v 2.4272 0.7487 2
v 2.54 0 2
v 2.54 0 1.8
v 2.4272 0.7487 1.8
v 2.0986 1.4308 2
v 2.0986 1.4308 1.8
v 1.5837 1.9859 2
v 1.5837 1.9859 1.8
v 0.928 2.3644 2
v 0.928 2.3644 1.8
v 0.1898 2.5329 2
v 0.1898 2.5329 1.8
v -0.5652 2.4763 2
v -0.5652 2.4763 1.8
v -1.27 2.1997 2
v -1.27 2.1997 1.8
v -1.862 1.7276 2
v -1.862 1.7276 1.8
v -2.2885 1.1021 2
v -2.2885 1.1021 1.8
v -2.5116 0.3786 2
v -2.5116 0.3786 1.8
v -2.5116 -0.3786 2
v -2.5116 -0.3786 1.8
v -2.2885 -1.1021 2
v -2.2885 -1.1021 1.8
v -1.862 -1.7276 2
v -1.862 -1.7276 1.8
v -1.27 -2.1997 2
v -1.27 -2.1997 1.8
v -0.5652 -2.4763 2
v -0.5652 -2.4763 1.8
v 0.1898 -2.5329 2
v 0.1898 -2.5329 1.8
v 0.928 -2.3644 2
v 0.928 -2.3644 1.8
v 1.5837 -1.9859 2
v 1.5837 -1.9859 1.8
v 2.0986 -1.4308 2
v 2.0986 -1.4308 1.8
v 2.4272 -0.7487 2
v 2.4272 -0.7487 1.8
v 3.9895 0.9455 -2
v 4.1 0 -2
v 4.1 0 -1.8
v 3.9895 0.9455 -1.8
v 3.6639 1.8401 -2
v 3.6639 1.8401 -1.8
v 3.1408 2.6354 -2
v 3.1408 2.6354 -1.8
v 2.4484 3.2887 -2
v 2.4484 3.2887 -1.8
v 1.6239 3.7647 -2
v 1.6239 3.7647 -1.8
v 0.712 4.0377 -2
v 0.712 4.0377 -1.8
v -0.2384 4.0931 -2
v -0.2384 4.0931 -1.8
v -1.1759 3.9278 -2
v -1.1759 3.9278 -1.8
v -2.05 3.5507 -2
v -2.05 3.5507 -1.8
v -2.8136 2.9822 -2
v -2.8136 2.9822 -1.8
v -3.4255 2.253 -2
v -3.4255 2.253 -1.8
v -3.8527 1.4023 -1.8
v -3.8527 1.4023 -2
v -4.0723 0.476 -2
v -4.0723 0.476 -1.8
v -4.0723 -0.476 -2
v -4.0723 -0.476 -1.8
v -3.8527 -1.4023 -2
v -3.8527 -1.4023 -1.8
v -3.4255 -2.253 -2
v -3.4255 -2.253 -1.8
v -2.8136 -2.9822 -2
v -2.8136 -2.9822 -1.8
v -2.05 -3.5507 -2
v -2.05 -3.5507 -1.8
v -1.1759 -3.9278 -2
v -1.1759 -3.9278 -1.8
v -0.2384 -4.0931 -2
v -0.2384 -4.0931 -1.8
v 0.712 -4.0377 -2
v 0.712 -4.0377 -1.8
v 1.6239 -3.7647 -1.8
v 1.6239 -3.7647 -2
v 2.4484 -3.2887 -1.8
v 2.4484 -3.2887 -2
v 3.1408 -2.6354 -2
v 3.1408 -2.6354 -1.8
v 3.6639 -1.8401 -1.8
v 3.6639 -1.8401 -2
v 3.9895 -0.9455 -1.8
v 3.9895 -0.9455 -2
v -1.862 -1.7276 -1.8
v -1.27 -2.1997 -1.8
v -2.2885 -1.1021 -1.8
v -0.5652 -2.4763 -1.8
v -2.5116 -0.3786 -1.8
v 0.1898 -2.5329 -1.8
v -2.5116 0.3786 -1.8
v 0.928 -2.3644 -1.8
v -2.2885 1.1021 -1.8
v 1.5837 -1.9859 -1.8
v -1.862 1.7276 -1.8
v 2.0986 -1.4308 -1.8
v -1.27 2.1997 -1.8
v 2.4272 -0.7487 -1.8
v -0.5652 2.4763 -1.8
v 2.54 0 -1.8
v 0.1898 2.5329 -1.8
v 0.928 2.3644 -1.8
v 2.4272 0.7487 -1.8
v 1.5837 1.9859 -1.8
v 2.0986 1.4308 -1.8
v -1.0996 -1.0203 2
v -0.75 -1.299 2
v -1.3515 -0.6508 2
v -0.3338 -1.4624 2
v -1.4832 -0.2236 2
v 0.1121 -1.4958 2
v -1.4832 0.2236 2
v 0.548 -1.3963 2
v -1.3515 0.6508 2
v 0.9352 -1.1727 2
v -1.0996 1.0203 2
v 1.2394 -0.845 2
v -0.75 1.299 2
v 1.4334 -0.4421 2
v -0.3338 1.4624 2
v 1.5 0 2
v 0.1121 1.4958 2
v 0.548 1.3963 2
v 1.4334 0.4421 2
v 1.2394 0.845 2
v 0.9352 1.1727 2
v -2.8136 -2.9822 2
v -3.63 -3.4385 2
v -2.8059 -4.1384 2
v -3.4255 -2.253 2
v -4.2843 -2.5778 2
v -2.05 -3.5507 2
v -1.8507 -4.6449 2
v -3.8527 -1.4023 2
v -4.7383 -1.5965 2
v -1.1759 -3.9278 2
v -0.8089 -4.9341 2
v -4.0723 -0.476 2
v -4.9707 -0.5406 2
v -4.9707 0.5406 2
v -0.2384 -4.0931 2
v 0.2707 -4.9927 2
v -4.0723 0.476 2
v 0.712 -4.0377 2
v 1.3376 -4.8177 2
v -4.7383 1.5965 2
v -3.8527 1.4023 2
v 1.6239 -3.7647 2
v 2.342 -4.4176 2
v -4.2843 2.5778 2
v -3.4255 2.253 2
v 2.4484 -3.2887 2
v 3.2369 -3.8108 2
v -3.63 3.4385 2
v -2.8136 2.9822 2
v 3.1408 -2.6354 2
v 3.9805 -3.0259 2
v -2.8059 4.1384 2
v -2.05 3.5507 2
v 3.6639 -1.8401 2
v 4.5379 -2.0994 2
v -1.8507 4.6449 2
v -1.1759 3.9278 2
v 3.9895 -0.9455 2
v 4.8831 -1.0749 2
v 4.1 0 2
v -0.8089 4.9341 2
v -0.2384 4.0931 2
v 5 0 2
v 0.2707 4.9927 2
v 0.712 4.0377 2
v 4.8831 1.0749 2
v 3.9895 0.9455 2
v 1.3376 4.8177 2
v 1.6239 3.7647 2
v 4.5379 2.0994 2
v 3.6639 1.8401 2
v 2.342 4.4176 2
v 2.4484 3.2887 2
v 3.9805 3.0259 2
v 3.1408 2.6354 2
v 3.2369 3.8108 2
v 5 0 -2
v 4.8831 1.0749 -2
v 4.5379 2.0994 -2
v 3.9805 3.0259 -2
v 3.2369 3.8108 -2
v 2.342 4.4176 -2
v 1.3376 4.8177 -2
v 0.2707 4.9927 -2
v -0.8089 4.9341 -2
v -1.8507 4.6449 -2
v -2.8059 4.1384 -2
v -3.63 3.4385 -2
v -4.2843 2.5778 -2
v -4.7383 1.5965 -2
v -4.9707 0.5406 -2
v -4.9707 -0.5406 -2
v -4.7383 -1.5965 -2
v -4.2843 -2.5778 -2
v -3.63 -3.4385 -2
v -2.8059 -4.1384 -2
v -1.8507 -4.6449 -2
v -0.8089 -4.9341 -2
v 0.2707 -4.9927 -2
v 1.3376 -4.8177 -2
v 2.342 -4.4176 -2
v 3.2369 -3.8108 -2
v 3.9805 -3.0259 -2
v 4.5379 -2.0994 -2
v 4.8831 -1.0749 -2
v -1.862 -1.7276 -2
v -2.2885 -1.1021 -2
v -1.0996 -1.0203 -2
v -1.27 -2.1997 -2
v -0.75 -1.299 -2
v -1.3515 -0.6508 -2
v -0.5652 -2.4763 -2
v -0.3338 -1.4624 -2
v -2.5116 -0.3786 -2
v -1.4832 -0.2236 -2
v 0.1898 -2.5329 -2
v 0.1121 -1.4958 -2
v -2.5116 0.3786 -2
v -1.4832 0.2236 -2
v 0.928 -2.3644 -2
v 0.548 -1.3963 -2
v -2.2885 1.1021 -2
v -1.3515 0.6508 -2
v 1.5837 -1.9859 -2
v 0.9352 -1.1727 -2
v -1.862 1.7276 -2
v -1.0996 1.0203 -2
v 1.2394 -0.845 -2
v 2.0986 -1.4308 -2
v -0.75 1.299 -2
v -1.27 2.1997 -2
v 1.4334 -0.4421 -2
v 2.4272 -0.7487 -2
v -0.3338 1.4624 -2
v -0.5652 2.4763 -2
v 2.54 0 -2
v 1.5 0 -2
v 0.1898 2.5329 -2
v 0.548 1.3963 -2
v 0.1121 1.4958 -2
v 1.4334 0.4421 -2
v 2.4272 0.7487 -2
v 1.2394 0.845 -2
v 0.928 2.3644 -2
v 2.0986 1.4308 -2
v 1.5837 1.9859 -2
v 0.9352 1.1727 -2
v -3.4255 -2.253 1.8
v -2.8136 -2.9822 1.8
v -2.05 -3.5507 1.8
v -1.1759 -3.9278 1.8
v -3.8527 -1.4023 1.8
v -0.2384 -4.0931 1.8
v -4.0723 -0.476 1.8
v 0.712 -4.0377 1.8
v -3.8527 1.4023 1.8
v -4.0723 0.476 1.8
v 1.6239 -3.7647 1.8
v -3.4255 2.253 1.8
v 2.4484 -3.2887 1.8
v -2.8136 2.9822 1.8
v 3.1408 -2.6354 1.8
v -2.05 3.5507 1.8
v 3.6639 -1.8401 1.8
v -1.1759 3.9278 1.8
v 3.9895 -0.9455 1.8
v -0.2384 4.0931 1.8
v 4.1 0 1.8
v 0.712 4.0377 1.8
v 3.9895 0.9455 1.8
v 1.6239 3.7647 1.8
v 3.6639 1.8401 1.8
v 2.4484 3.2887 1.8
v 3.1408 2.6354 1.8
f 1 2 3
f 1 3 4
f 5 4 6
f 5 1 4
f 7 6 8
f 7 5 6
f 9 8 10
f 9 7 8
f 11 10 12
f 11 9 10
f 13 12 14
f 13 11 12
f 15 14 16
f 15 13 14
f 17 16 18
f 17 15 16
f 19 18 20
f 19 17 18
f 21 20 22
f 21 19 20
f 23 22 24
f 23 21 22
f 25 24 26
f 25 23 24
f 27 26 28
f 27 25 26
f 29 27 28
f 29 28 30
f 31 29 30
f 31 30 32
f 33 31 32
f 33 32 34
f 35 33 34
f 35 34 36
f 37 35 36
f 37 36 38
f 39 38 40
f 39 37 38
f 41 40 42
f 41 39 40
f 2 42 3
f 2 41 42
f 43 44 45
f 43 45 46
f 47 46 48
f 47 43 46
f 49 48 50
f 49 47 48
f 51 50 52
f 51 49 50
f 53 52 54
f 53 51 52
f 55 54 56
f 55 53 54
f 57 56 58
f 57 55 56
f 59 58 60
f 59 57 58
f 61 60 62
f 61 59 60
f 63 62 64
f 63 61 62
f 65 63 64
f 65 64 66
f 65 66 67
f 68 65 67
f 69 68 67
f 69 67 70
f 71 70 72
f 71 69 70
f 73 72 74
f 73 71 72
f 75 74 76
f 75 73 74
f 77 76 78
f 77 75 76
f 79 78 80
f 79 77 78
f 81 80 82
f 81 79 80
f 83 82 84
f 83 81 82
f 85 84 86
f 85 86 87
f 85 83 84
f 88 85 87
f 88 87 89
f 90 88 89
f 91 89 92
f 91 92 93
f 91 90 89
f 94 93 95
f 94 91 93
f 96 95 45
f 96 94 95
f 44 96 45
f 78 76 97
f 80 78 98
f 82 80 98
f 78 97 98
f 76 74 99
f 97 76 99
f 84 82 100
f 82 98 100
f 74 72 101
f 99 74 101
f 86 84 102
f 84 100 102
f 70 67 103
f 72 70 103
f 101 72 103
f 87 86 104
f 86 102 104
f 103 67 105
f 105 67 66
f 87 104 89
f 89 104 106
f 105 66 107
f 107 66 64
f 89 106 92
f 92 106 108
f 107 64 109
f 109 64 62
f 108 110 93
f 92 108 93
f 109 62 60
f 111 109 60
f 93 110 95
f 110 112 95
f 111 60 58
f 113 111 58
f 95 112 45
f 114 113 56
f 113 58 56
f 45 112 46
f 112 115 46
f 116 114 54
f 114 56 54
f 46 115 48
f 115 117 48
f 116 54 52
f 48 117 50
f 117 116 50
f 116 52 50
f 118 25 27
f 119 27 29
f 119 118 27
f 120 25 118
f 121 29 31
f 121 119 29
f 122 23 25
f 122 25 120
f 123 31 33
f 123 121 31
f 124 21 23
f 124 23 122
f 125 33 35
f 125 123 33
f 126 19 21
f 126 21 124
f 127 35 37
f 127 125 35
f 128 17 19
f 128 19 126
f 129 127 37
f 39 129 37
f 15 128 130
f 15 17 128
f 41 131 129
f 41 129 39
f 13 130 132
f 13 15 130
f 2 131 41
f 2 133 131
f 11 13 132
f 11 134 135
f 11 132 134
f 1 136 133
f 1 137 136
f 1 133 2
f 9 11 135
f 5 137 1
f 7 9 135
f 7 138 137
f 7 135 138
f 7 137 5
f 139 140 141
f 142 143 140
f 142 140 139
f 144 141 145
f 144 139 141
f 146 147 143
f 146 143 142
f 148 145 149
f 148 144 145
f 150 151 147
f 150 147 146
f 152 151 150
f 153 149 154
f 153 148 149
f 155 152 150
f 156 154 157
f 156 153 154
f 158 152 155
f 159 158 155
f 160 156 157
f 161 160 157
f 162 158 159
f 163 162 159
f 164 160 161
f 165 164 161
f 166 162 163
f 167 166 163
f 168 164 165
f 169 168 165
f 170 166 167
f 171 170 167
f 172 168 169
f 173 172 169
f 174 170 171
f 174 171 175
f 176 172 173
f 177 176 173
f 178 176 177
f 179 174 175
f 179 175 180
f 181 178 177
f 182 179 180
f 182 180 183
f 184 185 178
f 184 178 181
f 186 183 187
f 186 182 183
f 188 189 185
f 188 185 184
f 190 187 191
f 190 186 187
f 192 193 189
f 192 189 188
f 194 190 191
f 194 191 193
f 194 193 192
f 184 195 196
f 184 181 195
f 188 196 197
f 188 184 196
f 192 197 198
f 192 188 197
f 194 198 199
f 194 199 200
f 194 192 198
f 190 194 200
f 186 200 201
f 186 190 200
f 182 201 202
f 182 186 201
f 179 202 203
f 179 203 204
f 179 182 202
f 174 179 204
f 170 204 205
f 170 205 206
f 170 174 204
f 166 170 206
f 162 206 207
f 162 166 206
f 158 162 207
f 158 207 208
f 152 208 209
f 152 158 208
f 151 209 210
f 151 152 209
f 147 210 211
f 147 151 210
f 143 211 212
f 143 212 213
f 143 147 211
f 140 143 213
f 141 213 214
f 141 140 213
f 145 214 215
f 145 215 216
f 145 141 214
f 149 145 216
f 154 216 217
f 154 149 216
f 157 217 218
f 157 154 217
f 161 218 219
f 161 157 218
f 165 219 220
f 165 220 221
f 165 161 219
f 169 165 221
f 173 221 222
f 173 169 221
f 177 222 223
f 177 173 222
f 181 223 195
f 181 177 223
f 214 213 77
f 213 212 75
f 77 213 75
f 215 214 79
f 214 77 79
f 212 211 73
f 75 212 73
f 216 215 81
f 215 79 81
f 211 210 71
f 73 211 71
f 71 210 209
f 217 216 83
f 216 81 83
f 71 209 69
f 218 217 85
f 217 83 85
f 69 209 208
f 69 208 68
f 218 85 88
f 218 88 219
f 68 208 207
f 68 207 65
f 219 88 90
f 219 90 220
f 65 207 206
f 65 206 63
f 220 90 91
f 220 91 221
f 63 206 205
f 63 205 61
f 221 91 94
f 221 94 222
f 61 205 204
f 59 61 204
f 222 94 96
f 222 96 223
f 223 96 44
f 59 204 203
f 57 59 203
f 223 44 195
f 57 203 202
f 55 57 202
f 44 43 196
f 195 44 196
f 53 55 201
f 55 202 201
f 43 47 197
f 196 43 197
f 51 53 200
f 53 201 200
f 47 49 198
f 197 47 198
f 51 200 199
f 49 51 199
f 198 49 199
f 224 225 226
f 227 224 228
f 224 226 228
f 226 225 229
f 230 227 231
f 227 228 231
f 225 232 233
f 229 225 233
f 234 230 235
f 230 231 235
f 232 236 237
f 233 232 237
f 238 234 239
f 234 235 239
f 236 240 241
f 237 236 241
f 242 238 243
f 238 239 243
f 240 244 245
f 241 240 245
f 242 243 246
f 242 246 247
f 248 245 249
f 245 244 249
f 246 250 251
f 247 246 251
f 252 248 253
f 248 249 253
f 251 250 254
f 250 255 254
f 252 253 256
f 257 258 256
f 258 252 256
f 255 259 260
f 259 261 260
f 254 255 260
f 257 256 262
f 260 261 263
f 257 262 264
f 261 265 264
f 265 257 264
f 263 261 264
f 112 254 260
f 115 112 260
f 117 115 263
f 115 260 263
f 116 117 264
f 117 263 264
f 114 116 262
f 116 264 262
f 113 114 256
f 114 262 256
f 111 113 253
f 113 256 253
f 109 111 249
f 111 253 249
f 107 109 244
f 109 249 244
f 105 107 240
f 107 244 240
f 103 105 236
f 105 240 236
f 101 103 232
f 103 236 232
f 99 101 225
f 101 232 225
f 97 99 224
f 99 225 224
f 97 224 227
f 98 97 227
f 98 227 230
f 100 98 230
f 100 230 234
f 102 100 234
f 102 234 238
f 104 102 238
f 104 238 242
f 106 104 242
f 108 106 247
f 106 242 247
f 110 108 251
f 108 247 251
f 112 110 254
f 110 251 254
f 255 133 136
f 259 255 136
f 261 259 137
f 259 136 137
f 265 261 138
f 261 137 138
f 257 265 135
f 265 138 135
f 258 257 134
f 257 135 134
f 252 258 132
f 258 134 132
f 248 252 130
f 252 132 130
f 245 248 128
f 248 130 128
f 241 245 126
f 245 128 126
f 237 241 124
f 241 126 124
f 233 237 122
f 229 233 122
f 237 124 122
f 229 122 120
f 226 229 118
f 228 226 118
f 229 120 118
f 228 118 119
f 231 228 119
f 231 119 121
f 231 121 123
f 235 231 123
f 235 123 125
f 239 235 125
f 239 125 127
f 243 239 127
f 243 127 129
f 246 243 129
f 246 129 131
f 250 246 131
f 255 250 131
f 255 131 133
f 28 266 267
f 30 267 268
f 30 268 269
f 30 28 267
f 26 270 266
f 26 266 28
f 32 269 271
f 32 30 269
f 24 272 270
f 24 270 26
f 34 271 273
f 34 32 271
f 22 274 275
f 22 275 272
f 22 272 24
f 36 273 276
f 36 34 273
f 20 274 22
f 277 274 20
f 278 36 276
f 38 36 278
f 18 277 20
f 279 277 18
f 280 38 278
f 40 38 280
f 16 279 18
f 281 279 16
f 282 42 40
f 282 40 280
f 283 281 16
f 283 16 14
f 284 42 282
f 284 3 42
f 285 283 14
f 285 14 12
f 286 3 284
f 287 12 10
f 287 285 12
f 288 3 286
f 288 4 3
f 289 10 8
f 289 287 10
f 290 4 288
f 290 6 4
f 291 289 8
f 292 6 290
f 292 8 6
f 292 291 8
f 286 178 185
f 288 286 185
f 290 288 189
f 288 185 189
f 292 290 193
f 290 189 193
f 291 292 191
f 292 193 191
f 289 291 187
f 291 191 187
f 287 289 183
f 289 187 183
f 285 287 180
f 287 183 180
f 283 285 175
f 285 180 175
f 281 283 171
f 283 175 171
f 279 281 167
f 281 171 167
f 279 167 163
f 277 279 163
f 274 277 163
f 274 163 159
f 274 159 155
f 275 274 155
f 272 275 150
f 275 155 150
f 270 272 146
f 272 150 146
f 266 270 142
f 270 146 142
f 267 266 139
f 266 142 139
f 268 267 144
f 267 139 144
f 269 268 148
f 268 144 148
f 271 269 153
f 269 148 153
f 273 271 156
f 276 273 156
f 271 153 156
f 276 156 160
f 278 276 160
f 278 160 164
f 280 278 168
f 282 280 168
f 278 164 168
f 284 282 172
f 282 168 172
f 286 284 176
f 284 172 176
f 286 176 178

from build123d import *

# Parameters (mm, degrees)
SKETCH_1_R          = 5
EXTRUDE_1_DEPTH     = 2
SKETCH_2_R          = 1.5
CUT_EXTRUDE_1_DEPTH = 5
SKETCH_3_R          = 4.1
SKETCH_3_R_2        = 2.54
CUT_EXTRUDE_2_DEPTH = 0.2


with BuildPart() as part:
    # 草圖1 → 填料-伸長1 (new body, symmetric)
    with BuildSketch(Plane.XY):
        Circle(SKETCH_1_R)
    extrude(amount=EXTRUDE_1_DEPTH, both=True)

    # 草圖2 → 除料-伸長1 (cut, through all)
    with BuildSketch(Plane.XY.offset(2)):
        Circle(SKETCH_2_R)
    extrude(amount=-CUT_EXTRUDE_1_DEPTH, mode=Mode.SUBTRACT)

    # 草圖3 → 除料-伸長2 (cut)
    with BuildSketch(Plane.XY.offset(2)):
        Circle(SKETCH_3_R)
        Circle(SKETCH_3_R_2, mode=Mode.SUBTRACT)
    cut_extrude_2 = extrude(amount=-CUT_EXTRUDE_2_DEPTH, mode=Mode.SUBTRACT)

    # 鏡射1: 除料-伸長2 across plane
    add(cut_extrude_2.mirror(Plane.XY), mode=Mode.SUBTRACT)


solid = part.part
